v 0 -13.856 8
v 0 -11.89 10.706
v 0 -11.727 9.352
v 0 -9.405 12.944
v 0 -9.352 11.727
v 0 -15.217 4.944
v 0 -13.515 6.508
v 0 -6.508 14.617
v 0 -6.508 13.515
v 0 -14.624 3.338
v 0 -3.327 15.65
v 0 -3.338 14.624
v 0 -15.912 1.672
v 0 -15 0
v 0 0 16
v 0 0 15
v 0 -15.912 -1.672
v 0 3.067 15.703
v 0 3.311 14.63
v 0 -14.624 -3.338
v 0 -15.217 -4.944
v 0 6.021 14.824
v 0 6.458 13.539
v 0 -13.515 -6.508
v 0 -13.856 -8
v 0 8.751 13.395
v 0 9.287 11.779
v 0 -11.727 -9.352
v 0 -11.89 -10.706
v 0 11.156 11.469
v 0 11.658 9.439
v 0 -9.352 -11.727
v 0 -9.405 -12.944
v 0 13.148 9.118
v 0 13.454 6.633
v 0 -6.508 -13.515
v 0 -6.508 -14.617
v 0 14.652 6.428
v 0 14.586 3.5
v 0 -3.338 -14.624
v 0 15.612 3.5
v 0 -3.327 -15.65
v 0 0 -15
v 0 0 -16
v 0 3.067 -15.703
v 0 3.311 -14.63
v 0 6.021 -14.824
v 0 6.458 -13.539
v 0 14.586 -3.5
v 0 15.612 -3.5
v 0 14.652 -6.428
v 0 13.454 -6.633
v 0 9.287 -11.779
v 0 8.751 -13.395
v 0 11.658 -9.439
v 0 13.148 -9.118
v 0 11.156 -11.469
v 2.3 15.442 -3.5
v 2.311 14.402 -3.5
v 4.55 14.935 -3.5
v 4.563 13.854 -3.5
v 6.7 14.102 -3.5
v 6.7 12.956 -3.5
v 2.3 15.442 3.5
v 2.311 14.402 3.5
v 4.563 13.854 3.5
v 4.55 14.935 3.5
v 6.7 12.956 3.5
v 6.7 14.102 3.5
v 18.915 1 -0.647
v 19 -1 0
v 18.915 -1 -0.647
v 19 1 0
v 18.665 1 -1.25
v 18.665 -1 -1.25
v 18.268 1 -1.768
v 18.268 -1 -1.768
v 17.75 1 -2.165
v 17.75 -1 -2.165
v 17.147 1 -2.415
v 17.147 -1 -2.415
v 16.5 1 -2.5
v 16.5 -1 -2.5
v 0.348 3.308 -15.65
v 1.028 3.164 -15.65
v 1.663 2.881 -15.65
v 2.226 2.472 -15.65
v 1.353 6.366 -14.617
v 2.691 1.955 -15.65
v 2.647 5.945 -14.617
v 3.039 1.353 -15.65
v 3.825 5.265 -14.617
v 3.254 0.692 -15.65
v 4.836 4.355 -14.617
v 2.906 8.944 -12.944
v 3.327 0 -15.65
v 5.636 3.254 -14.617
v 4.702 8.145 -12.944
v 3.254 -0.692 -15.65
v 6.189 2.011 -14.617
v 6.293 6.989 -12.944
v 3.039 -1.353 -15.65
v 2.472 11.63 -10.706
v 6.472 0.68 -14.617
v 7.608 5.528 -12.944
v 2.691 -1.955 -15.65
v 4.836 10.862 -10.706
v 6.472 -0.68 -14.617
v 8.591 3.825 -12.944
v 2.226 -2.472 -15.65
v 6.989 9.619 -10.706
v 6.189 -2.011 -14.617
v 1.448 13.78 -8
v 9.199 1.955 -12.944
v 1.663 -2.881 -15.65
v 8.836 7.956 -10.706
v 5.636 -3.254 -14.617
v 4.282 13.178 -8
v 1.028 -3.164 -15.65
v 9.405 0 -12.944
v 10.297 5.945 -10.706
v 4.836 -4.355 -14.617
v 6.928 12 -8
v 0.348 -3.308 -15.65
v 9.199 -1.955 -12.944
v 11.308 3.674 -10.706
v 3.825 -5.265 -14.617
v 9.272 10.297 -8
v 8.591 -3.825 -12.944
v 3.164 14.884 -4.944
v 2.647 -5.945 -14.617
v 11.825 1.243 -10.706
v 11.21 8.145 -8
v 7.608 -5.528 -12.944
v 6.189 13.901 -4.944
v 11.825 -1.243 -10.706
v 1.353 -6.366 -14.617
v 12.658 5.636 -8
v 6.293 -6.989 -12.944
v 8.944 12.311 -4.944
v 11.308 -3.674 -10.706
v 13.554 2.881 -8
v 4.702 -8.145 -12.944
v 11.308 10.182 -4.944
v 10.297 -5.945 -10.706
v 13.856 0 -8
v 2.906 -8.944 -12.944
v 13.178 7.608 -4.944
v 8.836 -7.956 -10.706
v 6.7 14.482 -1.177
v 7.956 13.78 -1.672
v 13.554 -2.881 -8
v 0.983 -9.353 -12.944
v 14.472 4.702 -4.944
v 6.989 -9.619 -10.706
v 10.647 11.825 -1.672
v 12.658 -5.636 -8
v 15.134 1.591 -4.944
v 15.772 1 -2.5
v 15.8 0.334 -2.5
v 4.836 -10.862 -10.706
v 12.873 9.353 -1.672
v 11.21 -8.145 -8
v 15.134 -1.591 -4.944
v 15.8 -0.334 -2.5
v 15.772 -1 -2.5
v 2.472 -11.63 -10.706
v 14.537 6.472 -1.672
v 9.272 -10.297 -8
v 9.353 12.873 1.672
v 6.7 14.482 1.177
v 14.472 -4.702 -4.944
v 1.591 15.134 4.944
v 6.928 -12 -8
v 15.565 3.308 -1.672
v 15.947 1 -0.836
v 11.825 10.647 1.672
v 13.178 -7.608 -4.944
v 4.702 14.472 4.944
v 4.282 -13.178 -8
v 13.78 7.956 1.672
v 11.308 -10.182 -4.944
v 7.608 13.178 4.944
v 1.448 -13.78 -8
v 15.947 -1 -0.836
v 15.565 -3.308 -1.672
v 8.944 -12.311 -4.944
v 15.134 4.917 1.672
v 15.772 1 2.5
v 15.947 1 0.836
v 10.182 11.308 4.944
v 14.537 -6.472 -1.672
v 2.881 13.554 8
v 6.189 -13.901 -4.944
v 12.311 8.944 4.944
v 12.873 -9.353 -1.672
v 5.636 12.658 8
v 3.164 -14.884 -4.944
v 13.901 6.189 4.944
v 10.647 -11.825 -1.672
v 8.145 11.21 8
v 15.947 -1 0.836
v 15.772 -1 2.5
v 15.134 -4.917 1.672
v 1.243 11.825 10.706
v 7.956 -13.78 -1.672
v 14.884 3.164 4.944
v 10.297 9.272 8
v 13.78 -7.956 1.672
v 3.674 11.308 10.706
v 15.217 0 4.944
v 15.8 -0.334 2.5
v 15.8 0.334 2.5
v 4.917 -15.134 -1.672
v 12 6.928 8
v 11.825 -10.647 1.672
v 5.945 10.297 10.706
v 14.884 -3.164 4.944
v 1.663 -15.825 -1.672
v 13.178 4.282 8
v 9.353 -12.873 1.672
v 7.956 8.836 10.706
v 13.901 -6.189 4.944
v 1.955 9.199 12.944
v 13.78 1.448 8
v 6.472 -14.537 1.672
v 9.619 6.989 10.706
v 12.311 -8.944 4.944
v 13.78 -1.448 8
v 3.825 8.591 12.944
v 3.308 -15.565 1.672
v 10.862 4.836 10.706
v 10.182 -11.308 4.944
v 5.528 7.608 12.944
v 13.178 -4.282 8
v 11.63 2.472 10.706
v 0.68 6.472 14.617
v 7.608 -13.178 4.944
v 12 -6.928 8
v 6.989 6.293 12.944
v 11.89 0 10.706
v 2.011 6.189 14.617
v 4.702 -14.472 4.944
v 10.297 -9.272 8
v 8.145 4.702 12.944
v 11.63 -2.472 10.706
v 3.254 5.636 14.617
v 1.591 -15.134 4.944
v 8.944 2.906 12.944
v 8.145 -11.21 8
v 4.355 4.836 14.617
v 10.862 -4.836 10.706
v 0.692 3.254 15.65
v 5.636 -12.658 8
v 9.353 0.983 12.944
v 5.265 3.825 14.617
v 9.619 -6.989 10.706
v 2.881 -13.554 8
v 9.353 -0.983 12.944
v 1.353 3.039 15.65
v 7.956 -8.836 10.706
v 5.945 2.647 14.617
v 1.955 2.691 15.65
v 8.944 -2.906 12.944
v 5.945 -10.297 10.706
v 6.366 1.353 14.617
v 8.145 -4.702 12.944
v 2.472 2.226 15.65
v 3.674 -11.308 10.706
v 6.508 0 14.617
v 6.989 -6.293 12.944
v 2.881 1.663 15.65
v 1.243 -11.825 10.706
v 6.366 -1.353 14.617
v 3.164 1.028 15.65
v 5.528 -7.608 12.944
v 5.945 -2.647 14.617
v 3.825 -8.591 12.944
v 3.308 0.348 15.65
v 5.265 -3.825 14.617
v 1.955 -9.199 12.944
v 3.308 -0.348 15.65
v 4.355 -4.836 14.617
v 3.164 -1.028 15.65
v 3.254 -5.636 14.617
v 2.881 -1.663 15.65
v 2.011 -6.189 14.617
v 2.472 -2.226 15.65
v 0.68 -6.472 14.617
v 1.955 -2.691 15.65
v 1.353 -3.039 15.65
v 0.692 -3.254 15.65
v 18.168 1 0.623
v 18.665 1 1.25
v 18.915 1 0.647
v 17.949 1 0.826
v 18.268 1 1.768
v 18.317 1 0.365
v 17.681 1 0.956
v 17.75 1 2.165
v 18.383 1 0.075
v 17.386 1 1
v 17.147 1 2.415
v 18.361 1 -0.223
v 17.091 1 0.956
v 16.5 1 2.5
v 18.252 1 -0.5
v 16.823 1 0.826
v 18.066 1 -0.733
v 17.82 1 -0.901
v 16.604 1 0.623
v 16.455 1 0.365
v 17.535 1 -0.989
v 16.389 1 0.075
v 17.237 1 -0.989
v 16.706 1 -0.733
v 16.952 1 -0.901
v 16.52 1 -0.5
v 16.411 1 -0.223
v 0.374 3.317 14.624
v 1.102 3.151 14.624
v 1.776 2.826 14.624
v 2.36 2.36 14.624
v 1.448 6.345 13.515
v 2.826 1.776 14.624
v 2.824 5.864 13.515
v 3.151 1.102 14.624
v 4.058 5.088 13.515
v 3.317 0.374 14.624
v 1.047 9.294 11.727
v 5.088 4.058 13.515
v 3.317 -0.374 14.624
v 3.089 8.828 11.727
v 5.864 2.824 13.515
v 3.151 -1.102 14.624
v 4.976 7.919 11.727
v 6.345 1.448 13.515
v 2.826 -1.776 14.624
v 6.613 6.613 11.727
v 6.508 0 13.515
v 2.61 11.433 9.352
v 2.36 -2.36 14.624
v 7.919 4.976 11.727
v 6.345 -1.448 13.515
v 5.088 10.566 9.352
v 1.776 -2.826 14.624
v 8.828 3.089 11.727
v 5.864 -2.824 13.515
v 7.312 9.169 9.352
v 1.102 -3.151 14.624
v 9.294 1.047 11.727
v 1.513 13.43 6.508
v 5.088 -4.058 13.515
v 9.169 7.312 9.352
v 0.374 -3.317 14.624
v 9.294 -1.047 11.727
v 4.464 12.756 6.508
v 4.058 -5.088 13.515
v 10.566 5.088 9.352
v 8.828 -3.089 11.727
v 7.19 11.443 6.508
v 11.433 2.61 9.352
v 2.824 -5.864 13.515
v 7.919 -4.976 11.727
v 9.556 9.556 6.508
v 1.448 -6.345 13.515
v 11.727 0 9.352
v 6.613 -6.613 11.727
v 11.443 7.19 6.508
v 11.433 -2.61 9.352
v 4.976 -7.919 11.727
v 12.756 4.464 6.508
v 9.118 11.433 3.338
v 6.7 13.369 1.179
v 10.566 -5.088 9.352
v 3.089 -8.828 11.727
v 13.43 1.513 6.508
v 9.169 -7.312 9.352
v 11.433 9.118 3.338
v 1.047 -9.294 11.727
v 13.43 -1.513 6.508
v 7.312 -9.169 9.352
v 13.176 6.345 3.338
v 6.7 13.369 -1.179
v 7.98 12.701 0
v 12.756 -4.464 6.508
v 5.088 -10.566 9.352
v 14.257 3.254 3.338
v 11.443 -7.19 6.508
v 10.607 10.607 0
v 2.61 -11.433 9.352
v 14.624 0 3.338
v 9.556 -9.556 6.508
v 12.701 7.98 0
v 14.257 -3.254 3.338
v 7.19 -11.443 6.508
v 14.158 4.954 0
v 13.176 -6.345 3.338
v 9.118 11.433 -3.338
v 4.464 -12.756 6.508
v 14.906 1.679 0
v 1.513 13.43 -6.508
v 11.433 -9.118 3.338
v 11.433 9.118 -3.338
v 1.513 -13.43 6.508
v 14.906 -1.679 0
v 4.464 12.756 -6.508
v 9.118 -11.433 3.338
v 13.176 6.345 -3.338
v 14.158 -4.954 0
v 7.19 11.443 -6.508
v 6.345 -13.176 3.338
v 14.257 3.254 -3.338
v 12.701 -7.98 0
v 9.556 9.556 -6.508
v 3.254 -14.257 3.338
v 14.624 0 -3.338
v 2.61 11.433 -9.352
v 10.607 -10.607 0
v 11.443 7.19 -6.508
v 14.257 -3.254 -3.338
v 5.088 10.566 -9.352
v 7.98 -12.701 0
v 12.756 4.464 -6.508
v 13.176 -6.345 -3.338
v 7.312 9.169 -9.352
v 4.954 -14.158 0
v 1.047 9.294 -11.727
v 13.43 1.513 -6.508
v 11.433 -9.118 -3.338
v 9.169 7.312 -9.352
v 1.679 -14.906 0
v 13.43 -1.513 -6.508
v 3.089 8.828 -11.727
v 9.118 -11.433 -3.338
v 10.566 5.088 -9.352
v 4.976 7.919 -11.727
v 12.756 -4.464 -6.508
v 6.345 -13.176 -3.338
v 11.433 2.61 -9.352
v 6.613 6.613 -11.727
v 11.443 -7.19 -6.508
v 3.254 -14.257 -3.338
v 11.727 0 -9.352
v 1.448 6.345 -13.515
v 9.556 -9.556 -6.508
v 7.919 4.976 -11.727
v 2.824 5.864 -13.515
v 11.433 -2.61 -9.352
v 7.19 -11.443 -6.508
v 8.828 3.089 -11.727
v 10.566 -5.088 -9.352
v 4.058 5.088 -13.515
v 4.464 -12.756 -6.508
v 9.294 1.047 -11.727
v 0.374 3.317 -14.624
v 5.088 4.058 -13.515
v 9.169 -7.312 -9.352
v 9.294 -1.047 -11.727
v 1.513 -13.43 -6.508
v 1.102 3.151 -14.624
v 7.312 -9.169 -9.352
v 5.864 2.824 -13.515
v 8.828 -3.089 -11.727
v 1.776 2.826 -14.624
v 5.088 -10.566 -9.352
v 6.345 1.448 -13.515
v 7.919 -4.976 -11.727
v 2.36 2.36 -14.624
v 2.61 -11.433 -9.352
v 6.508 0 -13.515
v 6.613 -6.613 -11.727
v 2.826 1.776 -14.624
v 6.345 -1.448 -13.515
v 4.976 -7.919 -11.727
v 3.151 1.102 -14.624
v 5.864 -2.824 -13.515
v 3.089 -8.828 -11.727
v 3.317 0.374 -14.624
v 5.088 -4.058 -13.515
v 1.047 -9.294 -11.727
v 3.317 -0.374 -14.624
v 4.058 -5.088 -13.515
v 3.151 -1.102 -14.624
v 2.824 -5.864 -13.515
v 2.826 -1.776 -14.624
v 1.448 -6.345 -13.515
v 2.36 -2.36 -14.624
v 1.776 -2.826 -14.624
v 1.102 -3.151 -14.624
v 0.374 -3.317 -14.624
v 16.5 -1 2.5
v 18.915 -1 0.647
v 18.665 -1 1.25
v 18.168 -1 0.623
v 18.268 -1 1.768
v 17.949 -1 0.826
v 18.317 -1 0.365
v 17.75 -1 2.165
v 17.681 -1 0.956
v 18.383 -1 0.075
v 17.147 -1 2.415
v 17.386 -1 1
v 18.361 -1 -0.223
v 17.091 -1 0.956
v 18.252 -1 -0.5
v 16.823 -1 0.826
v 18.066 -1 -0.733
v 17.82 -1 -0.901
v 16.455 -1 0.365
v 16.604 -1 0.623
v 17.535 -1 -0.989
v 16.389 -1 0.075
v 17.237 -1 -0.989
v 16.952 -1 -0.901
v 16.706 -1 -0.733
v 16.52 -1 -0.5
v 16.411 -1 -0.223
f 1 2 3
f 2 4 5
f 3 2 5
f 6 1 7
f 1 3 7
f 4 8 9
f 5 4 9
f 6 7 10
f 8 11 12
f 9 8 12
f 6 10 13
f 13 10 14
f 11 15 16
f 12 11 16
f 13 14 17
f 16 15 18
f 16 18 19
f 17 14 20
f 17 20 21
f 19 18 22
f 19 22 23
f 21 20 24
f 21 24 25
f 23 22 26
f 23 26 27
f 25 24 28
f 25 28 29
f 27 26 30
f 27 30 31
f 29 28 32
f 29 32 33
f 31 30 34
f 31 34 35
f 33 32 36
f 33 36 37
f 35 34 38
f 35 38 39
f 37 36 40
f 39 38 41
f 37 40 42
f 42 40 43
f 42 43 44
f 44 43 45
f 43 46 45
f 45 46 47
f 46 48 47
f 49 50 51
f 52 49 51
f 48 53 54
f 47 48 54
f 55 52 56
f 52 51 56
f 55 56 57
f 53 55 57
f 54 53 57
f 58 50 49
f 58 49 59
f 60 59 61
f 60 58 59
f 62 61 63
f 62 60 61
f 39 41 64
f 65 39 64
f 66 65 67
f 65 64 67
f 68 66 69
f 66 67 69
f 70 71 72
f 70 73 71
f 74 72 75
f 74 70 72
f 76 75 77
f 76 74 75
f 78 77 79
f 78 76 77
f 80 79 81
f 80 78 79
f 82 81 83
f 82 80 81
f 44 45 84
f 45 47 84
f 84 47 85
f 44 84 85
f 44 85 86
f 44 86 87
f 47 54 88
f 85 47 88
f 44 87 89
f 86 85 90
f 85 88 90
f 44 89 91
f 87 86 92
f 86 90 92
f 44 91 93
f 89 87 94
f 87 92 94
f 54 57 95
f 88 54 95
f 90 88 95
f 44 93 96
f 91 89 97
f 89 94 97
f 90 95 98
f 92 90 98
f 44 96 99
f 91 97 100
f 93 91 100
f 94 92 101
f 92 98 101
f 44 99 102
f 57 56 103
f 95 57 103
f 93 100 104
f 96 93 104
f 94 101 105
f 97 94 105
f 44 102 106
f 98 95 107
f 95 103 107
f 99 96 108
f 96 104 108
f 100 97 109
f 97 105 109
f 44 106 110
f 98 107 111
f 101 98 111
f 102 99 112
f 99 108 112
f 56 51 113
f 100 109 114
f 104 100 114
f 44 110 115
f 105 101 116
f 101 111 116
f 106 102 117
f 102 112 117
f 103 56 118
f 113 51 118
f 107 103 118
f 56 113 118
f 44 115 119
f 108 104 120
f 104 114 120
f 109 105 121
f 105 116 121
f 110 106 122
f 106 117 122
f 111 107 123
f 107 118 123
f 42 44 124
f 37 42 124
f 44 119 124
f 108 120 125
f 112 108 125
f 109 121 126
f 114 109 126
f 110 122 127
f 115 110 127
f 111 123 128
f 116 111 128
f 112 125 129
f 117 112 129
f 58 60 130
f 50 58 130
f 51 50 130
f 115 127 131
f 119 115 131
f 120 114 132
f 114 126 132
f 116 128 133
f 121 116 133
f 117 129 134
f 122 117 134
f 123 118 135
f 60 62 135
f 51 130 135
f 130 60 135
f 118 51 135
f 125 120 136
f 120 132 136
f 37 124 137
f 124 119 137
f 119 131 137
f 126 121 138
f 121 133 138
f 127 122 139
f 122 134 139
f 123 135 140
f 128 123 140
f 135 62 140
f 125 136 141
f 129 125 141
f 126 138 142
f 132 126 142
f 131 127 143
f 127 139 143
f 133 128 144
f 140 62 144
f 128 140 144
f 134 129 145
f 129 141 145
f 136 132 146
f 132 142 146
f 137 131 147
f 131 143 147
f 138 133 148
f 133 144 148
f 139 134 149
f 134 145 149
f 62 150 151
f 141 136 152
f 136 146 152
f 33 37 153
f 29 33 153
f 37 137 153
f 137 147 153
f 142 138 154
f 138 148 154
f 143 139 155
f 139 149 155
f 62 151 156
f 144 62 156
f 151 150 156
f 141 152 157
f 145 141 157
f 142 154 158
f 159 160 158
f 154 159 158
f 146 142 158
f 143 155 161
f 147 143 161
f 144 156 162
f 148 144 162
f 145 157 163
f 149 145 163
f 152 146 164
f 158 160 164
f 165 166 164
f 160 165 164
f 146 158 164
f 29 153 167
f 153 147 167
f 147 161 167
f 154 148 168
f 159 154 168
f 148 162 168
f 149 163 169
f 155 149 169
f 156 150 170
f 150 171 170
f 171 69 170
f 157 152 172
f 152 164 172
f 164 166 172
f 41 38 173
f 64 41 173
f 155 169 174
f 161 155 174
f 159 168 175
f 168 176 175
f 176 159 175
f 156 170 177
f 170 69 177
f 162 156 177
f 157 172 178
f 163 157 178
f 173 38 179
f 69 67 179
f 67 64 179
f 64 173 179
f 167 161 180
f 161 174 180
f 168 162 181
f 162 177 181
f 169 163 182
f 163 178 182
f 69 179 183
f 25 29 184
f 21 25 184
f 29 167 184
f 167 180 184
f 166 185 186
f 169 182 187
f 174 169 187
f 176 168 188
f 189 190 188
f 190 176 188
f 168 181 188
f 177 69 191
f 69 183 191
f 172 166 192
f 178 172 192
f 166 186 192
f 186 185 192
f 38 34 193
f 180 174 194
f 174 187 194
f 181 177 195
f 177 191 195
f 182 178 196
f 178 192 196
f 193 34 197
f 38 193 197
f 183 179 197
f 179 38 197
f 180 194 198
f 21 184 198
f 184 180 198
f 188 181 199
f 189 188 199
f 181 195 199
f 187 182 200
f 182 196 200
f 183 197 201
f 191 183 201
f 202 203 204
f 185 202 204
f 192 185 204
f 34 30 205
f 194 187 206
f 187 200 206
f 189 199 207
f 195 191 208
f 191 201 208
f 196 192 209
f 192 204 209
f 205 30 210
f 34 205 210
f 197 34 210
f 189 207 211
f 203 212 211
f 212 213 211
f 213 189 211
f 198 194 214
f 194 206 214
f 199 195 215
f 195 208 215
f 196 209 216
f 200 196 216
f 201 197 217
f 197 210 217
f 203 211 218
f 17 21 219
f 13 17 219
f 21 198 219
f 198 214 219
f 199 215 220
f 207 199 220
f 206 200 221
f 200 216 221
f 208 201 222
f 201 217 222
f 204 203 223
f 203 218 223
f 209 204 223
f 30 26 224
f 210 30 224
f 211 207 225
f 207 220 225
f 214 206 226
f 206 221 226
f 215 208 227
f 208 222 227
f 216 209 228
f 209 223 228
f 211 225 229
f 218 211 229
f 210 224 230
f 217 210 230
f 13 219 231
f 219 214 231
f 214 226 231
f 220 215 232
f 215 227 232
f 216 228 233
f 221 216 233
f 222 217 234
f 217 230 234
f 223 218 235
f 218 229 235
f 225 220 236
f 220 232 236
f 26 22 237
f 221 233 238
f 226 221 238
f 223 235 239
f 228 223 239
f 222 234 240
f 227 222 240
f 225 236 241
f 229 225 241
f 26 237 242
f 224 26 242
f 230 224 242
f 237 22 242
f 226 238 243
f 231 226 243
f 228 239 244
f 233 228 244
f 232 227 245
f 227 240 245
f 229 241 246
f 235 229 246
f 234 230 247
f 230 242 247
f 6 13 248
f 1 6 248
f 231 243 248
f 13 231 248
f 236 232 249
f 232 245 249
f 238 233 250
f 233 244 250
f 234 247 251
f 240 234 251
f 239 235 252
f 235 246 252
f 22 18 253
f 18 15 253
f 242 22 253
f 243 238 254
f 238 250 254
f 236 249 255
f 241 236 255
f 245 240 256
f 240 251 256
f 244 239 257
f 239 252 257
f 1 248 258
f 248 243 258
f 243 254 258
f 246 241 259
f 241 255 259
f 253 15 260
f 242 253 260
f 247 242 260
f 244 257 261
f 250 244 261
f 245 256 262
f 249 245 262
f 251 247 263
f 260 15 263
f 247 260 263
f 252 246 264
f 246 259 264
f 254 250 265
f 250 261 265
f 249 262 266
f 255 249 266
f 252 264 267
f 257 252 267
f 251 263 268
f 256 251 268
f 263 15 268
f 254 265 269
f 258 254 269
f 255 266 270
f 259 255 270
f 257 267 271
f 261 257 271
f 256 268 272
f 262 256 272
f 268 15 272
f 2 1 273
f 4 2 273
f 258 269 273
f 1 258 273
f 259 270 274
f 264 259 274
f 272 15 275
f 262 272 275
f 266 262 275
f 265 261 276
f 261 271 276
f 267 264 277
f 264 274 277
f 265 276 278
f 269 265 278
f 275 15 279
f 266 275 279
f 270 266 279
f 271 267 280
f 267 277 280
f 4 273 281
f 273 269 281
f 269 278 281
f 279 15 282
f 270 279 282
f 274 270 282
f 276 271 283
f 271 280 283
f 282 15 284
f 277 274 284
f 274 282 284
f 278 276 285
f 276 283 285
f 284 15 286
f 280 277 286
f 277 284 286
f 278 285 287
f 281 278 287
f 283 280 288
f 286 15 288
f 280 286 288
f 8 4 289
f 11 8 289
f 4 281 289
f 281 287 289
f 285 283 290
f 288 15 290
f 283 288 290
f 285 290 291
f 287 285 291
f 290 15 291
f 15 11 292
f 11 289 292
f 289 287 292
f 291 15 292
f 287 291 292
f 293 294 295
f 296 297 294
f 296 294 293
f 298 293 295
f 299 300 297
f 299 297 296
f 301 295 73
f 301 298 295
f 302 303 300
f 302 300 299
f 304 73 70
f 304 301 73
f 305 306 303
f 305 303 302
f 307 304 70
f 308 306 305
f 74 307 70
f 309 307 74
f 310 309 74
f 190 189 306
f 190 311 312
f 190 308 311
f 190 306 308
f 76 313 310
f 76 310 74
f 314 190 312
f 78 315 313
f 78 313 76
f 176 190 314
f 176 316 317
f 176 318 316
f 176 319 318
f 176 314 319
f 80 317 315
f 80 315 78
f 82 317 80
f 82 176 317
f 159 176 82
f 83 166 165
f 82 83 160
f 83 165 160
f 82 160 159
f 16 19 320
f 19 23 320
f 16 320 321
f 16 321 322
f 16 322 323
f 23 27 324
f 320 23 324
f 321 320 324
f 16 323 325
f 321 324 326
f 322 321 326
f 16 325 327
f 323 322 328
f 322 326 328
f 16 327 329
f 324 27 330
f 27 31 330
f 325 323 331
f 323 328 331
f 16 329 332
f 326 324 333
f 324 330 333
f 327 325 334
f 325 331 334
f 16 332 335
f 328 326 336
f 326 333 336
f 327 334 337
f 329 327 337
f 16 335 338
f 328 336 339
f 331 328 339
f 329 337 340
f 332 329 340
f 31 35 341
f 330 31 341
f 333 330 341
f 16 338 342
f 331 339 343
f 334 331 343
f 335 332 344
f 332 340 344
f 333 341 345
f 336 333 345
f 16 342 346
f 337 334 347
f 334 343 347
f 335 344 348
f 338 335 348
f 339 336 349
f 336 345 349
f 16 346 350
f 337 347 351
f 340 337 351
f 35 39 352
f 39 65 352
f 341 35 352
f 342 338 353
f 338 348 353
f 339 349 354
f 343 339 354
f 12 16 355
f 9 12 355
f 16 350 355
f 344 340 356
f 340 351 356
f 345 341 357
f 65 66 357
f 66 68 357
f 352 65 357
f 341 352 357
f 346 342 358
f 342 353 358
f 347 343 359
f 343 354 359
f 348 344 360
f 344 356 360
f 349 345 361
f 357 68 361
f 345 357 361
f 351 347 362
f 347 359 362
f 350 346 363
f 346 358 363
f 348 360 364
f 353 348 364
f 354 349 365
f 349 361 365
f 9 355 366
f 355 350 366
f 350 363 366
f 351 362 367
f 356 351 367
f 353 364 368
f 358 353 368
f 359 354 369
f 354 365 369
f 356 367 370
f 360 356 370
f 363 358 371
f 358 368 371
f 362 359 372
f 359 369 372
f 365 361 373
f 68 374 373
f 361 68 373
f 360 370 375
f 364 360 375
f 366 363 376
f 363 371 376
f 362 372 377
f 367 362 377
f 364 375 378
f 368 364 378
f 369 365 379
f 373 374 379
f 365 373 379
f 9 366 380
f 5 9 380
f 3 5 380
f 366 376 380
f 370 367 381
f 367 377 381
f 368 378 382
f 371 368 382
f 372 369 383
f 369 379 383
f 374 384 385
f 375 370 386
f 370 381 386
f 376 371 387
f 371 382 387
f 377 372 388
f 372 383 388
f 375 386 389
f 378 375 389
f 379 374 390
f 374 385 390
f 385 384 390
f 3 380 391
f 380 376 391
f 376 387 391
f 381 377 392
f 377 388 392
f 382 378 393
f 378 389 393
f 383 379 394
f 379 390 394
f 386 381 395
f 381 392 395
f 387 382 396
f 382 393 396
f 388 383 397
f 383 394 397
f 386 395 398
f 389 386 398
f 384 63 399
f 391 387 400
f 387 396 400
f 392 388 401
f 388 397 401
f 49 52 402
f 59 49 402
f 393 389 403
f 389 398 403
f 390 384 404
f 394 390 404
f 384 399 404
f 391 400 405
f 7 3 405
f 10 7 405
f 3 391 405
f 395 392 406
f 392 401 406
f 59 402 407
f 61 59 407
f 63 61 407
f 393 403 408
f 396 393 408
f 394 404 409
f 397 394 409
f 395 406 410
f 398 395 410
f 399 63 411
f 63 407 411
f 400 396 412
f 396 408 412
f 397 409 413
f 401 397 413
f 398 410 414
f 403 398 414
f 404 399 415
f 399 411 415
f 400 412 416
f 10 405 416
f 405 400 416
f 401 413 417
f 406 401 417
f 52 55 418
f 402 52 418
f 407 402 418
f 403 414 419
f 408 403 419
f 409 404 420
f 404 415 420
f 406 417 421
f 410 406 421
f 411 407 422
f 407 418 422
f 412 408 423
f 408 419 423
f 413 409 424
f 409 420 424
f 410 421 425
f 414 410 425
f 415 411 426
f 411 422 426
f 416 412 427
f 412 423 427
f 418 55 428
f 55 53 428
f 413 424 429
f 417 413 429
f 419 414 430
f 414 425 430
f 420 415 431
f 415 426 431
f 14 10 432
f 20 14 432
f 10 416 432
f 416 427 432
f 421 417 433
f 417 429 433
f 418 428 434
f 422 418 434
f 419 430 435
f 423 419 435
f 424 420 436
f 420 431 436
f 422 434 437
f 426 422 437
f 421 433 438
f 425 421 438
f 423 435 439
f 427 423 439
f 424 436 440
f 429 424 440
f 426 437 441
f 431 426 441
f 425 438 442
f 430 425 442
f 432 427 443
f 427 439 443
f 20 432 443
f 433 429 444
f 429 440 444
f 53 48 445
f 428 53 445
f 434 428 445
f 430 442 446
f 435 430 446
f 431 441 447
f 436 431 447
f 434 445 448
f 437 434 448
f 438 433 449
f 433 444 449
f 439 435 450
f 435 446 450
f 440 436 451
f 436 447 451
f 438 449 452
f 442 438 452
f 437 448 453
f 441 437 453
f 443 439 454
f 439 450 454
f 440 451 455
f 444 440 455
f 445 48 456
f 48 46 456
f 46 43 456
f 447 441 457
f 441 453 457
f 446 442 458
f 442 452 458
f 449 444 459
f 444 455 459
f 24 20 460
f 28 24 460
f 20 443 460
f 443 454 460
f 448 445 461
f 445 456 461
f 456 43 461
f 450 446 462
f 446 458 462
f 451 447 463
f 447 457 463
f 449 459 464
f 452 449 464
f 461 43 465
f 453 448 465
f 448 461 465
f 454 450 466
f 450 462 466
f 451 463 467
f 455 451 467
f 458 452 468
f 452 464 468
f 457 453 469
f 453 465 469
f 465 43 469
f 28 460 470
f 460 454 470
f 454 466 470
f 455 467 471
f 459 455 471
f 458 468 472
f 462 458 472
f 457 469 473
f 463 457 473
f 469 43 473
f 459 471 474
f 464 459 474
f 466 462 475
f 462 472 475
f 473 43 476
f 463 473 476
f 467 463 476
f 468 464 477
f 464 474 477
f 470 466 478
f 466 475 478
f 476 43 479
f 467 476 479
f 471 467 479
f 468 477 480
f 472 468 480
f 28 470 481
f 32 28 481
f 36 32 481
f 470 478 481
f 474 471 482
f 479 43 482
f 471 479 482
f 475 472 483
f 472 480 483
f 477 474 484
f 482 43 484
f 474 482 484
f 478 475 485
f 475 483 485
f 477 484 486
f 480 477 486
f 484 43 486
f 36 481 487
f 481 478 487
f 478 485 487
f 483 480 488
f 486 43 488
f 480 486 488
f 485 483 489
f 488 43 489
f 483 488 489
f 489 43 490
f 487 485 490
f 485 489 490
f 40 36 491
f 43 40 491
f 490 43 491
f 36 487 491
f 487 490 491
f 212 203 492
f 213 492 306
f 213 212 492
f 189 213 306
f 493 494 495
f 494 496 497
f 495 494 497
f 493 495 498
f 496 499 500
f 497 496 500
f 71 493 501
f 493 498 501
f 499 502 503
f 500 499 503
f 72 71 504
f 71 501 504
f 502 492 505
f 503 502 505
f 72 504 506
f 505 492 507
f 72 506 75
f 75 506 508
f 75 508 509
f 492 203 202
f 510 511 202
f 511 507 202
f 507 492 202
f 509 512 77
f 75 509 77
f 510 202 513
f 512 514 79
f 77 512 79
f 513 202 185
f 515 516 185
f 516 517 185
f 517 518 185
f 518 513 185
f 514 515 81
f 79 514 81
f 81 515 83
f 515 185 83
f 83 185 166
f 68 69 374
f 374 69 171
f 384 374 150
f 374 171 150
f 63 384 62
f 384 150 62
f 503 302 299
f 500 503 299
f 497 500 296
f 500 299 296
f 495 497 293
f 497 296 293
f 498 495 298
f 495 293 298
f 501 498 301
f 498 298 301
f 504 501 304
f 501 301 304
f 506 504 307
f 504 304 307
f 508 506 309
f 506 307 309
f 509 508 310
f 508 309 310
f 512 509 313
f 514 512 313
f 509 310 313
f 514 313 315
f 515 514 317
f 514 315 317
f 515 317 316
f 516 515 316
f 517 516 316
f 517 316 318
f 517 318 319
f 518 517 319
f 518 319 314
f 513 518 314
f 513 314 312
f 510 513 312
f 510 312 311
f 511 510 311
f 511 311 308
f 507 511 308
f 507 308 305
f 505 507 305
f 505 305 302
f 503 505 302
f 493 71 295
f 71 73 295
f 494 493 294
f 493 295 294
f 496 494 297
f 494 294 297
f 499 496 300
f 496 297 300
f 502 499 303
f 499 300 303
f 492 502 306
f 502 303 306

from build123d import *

# Parameters (mm, degrees)
REVOLVE_2_ANGLE     = 180
SKETCH_2_W          = 5
SKETCH_2_H          = 2
EXTRUDE_1_DEPTH     = 4
SKETCH_3_R          = 1
CUT_EXTRUDE_1_DEPTH = 5
FILLET_1_R          = 2.5
FILLET_2_R          = 2.5
SKETCH_4_W          = 6.7
SKETCH_4_H          = 7
CUT_EXTRUDE_2_DEPTH = 15


with BuildPart() as part:
    # 草图1 → 旋转2 (revolve)
    with BuildSketch(Plane(origin=(0, 0, 0), x_dir=(0, 0, -1), z_dir=(1, 0, 0))):
        with BuildLine():
            Line((-16, 0), (-15, 0))
            ThreePointArc((-15, 0), (0, 15), (15, 0))
            Line((15, 0), (16, 0))
            ThreePointArc((16, 0), (0, 16), (-16, 0))
        make_face()
    revolve(axis=Axis((0, 0, -15), (0, 0, -1)), revolution_arc=REVOLVE_2_ANGLE)

    # 草图2 → 凸台-拉伸1 (add)
    with BuildSketch(Plane(origin=(15, 0, 0), x_dir=(0, 0, -1), z_dir=(1, 0, 0))):
        Rectangle(SKETCH_2_W, SKETCH_2_H)
    extrude(amount=EXTRUDE_1_DEPTH)

    # 草图3 → 切除-拉伸1 (cut)
    with BuildSketch(Plane(origin=(0, 1, 0), x_dir=(1, 0, 0), z_dir=(0, 1, 0))):
        with Locations(Location((17.385905148, 0, 0), (0, 0, 270))):
            Circle(SKETCH_3_R)
    extrude(amount=-CUT_EXTRUDE_1_DEPTH, mode=Mode.SUBTRACT)

    # 圆角1
    fillet_1_edges = [part.edges().sort_by_distance(p)[0] for p in [
        (19, 0, -2.5),
    ]]
    fillet(fillet_1_edges, radius=FILLET_1_R)

    # 圆角2
    fillet_2_edges = [part.edges().sort_by_distance(p)[0] for p in [
        (19, 0, 2.5),
    ]]
    fillet(fillet_2_edges, radius=FILLET_2_R - 0.0001)  # a hair under: the kernel refuses the full size

    # 草图4 → 切除-拉伸2 (cut)
    with BuildSketch(Plane(origin=(0, 18.626931023, 0), x_dir=(1, 0, 0), z_dir=(0, 1, 0))):
        with Locations((3.35, 0)):
            Rectangle(SKETCH_4_W, SKETCH_4_H)
    extrude(amount=-CUT_EXTRUDE_2_DEPTH, mode=Mode.SUBTRACT)


solid = part.part
